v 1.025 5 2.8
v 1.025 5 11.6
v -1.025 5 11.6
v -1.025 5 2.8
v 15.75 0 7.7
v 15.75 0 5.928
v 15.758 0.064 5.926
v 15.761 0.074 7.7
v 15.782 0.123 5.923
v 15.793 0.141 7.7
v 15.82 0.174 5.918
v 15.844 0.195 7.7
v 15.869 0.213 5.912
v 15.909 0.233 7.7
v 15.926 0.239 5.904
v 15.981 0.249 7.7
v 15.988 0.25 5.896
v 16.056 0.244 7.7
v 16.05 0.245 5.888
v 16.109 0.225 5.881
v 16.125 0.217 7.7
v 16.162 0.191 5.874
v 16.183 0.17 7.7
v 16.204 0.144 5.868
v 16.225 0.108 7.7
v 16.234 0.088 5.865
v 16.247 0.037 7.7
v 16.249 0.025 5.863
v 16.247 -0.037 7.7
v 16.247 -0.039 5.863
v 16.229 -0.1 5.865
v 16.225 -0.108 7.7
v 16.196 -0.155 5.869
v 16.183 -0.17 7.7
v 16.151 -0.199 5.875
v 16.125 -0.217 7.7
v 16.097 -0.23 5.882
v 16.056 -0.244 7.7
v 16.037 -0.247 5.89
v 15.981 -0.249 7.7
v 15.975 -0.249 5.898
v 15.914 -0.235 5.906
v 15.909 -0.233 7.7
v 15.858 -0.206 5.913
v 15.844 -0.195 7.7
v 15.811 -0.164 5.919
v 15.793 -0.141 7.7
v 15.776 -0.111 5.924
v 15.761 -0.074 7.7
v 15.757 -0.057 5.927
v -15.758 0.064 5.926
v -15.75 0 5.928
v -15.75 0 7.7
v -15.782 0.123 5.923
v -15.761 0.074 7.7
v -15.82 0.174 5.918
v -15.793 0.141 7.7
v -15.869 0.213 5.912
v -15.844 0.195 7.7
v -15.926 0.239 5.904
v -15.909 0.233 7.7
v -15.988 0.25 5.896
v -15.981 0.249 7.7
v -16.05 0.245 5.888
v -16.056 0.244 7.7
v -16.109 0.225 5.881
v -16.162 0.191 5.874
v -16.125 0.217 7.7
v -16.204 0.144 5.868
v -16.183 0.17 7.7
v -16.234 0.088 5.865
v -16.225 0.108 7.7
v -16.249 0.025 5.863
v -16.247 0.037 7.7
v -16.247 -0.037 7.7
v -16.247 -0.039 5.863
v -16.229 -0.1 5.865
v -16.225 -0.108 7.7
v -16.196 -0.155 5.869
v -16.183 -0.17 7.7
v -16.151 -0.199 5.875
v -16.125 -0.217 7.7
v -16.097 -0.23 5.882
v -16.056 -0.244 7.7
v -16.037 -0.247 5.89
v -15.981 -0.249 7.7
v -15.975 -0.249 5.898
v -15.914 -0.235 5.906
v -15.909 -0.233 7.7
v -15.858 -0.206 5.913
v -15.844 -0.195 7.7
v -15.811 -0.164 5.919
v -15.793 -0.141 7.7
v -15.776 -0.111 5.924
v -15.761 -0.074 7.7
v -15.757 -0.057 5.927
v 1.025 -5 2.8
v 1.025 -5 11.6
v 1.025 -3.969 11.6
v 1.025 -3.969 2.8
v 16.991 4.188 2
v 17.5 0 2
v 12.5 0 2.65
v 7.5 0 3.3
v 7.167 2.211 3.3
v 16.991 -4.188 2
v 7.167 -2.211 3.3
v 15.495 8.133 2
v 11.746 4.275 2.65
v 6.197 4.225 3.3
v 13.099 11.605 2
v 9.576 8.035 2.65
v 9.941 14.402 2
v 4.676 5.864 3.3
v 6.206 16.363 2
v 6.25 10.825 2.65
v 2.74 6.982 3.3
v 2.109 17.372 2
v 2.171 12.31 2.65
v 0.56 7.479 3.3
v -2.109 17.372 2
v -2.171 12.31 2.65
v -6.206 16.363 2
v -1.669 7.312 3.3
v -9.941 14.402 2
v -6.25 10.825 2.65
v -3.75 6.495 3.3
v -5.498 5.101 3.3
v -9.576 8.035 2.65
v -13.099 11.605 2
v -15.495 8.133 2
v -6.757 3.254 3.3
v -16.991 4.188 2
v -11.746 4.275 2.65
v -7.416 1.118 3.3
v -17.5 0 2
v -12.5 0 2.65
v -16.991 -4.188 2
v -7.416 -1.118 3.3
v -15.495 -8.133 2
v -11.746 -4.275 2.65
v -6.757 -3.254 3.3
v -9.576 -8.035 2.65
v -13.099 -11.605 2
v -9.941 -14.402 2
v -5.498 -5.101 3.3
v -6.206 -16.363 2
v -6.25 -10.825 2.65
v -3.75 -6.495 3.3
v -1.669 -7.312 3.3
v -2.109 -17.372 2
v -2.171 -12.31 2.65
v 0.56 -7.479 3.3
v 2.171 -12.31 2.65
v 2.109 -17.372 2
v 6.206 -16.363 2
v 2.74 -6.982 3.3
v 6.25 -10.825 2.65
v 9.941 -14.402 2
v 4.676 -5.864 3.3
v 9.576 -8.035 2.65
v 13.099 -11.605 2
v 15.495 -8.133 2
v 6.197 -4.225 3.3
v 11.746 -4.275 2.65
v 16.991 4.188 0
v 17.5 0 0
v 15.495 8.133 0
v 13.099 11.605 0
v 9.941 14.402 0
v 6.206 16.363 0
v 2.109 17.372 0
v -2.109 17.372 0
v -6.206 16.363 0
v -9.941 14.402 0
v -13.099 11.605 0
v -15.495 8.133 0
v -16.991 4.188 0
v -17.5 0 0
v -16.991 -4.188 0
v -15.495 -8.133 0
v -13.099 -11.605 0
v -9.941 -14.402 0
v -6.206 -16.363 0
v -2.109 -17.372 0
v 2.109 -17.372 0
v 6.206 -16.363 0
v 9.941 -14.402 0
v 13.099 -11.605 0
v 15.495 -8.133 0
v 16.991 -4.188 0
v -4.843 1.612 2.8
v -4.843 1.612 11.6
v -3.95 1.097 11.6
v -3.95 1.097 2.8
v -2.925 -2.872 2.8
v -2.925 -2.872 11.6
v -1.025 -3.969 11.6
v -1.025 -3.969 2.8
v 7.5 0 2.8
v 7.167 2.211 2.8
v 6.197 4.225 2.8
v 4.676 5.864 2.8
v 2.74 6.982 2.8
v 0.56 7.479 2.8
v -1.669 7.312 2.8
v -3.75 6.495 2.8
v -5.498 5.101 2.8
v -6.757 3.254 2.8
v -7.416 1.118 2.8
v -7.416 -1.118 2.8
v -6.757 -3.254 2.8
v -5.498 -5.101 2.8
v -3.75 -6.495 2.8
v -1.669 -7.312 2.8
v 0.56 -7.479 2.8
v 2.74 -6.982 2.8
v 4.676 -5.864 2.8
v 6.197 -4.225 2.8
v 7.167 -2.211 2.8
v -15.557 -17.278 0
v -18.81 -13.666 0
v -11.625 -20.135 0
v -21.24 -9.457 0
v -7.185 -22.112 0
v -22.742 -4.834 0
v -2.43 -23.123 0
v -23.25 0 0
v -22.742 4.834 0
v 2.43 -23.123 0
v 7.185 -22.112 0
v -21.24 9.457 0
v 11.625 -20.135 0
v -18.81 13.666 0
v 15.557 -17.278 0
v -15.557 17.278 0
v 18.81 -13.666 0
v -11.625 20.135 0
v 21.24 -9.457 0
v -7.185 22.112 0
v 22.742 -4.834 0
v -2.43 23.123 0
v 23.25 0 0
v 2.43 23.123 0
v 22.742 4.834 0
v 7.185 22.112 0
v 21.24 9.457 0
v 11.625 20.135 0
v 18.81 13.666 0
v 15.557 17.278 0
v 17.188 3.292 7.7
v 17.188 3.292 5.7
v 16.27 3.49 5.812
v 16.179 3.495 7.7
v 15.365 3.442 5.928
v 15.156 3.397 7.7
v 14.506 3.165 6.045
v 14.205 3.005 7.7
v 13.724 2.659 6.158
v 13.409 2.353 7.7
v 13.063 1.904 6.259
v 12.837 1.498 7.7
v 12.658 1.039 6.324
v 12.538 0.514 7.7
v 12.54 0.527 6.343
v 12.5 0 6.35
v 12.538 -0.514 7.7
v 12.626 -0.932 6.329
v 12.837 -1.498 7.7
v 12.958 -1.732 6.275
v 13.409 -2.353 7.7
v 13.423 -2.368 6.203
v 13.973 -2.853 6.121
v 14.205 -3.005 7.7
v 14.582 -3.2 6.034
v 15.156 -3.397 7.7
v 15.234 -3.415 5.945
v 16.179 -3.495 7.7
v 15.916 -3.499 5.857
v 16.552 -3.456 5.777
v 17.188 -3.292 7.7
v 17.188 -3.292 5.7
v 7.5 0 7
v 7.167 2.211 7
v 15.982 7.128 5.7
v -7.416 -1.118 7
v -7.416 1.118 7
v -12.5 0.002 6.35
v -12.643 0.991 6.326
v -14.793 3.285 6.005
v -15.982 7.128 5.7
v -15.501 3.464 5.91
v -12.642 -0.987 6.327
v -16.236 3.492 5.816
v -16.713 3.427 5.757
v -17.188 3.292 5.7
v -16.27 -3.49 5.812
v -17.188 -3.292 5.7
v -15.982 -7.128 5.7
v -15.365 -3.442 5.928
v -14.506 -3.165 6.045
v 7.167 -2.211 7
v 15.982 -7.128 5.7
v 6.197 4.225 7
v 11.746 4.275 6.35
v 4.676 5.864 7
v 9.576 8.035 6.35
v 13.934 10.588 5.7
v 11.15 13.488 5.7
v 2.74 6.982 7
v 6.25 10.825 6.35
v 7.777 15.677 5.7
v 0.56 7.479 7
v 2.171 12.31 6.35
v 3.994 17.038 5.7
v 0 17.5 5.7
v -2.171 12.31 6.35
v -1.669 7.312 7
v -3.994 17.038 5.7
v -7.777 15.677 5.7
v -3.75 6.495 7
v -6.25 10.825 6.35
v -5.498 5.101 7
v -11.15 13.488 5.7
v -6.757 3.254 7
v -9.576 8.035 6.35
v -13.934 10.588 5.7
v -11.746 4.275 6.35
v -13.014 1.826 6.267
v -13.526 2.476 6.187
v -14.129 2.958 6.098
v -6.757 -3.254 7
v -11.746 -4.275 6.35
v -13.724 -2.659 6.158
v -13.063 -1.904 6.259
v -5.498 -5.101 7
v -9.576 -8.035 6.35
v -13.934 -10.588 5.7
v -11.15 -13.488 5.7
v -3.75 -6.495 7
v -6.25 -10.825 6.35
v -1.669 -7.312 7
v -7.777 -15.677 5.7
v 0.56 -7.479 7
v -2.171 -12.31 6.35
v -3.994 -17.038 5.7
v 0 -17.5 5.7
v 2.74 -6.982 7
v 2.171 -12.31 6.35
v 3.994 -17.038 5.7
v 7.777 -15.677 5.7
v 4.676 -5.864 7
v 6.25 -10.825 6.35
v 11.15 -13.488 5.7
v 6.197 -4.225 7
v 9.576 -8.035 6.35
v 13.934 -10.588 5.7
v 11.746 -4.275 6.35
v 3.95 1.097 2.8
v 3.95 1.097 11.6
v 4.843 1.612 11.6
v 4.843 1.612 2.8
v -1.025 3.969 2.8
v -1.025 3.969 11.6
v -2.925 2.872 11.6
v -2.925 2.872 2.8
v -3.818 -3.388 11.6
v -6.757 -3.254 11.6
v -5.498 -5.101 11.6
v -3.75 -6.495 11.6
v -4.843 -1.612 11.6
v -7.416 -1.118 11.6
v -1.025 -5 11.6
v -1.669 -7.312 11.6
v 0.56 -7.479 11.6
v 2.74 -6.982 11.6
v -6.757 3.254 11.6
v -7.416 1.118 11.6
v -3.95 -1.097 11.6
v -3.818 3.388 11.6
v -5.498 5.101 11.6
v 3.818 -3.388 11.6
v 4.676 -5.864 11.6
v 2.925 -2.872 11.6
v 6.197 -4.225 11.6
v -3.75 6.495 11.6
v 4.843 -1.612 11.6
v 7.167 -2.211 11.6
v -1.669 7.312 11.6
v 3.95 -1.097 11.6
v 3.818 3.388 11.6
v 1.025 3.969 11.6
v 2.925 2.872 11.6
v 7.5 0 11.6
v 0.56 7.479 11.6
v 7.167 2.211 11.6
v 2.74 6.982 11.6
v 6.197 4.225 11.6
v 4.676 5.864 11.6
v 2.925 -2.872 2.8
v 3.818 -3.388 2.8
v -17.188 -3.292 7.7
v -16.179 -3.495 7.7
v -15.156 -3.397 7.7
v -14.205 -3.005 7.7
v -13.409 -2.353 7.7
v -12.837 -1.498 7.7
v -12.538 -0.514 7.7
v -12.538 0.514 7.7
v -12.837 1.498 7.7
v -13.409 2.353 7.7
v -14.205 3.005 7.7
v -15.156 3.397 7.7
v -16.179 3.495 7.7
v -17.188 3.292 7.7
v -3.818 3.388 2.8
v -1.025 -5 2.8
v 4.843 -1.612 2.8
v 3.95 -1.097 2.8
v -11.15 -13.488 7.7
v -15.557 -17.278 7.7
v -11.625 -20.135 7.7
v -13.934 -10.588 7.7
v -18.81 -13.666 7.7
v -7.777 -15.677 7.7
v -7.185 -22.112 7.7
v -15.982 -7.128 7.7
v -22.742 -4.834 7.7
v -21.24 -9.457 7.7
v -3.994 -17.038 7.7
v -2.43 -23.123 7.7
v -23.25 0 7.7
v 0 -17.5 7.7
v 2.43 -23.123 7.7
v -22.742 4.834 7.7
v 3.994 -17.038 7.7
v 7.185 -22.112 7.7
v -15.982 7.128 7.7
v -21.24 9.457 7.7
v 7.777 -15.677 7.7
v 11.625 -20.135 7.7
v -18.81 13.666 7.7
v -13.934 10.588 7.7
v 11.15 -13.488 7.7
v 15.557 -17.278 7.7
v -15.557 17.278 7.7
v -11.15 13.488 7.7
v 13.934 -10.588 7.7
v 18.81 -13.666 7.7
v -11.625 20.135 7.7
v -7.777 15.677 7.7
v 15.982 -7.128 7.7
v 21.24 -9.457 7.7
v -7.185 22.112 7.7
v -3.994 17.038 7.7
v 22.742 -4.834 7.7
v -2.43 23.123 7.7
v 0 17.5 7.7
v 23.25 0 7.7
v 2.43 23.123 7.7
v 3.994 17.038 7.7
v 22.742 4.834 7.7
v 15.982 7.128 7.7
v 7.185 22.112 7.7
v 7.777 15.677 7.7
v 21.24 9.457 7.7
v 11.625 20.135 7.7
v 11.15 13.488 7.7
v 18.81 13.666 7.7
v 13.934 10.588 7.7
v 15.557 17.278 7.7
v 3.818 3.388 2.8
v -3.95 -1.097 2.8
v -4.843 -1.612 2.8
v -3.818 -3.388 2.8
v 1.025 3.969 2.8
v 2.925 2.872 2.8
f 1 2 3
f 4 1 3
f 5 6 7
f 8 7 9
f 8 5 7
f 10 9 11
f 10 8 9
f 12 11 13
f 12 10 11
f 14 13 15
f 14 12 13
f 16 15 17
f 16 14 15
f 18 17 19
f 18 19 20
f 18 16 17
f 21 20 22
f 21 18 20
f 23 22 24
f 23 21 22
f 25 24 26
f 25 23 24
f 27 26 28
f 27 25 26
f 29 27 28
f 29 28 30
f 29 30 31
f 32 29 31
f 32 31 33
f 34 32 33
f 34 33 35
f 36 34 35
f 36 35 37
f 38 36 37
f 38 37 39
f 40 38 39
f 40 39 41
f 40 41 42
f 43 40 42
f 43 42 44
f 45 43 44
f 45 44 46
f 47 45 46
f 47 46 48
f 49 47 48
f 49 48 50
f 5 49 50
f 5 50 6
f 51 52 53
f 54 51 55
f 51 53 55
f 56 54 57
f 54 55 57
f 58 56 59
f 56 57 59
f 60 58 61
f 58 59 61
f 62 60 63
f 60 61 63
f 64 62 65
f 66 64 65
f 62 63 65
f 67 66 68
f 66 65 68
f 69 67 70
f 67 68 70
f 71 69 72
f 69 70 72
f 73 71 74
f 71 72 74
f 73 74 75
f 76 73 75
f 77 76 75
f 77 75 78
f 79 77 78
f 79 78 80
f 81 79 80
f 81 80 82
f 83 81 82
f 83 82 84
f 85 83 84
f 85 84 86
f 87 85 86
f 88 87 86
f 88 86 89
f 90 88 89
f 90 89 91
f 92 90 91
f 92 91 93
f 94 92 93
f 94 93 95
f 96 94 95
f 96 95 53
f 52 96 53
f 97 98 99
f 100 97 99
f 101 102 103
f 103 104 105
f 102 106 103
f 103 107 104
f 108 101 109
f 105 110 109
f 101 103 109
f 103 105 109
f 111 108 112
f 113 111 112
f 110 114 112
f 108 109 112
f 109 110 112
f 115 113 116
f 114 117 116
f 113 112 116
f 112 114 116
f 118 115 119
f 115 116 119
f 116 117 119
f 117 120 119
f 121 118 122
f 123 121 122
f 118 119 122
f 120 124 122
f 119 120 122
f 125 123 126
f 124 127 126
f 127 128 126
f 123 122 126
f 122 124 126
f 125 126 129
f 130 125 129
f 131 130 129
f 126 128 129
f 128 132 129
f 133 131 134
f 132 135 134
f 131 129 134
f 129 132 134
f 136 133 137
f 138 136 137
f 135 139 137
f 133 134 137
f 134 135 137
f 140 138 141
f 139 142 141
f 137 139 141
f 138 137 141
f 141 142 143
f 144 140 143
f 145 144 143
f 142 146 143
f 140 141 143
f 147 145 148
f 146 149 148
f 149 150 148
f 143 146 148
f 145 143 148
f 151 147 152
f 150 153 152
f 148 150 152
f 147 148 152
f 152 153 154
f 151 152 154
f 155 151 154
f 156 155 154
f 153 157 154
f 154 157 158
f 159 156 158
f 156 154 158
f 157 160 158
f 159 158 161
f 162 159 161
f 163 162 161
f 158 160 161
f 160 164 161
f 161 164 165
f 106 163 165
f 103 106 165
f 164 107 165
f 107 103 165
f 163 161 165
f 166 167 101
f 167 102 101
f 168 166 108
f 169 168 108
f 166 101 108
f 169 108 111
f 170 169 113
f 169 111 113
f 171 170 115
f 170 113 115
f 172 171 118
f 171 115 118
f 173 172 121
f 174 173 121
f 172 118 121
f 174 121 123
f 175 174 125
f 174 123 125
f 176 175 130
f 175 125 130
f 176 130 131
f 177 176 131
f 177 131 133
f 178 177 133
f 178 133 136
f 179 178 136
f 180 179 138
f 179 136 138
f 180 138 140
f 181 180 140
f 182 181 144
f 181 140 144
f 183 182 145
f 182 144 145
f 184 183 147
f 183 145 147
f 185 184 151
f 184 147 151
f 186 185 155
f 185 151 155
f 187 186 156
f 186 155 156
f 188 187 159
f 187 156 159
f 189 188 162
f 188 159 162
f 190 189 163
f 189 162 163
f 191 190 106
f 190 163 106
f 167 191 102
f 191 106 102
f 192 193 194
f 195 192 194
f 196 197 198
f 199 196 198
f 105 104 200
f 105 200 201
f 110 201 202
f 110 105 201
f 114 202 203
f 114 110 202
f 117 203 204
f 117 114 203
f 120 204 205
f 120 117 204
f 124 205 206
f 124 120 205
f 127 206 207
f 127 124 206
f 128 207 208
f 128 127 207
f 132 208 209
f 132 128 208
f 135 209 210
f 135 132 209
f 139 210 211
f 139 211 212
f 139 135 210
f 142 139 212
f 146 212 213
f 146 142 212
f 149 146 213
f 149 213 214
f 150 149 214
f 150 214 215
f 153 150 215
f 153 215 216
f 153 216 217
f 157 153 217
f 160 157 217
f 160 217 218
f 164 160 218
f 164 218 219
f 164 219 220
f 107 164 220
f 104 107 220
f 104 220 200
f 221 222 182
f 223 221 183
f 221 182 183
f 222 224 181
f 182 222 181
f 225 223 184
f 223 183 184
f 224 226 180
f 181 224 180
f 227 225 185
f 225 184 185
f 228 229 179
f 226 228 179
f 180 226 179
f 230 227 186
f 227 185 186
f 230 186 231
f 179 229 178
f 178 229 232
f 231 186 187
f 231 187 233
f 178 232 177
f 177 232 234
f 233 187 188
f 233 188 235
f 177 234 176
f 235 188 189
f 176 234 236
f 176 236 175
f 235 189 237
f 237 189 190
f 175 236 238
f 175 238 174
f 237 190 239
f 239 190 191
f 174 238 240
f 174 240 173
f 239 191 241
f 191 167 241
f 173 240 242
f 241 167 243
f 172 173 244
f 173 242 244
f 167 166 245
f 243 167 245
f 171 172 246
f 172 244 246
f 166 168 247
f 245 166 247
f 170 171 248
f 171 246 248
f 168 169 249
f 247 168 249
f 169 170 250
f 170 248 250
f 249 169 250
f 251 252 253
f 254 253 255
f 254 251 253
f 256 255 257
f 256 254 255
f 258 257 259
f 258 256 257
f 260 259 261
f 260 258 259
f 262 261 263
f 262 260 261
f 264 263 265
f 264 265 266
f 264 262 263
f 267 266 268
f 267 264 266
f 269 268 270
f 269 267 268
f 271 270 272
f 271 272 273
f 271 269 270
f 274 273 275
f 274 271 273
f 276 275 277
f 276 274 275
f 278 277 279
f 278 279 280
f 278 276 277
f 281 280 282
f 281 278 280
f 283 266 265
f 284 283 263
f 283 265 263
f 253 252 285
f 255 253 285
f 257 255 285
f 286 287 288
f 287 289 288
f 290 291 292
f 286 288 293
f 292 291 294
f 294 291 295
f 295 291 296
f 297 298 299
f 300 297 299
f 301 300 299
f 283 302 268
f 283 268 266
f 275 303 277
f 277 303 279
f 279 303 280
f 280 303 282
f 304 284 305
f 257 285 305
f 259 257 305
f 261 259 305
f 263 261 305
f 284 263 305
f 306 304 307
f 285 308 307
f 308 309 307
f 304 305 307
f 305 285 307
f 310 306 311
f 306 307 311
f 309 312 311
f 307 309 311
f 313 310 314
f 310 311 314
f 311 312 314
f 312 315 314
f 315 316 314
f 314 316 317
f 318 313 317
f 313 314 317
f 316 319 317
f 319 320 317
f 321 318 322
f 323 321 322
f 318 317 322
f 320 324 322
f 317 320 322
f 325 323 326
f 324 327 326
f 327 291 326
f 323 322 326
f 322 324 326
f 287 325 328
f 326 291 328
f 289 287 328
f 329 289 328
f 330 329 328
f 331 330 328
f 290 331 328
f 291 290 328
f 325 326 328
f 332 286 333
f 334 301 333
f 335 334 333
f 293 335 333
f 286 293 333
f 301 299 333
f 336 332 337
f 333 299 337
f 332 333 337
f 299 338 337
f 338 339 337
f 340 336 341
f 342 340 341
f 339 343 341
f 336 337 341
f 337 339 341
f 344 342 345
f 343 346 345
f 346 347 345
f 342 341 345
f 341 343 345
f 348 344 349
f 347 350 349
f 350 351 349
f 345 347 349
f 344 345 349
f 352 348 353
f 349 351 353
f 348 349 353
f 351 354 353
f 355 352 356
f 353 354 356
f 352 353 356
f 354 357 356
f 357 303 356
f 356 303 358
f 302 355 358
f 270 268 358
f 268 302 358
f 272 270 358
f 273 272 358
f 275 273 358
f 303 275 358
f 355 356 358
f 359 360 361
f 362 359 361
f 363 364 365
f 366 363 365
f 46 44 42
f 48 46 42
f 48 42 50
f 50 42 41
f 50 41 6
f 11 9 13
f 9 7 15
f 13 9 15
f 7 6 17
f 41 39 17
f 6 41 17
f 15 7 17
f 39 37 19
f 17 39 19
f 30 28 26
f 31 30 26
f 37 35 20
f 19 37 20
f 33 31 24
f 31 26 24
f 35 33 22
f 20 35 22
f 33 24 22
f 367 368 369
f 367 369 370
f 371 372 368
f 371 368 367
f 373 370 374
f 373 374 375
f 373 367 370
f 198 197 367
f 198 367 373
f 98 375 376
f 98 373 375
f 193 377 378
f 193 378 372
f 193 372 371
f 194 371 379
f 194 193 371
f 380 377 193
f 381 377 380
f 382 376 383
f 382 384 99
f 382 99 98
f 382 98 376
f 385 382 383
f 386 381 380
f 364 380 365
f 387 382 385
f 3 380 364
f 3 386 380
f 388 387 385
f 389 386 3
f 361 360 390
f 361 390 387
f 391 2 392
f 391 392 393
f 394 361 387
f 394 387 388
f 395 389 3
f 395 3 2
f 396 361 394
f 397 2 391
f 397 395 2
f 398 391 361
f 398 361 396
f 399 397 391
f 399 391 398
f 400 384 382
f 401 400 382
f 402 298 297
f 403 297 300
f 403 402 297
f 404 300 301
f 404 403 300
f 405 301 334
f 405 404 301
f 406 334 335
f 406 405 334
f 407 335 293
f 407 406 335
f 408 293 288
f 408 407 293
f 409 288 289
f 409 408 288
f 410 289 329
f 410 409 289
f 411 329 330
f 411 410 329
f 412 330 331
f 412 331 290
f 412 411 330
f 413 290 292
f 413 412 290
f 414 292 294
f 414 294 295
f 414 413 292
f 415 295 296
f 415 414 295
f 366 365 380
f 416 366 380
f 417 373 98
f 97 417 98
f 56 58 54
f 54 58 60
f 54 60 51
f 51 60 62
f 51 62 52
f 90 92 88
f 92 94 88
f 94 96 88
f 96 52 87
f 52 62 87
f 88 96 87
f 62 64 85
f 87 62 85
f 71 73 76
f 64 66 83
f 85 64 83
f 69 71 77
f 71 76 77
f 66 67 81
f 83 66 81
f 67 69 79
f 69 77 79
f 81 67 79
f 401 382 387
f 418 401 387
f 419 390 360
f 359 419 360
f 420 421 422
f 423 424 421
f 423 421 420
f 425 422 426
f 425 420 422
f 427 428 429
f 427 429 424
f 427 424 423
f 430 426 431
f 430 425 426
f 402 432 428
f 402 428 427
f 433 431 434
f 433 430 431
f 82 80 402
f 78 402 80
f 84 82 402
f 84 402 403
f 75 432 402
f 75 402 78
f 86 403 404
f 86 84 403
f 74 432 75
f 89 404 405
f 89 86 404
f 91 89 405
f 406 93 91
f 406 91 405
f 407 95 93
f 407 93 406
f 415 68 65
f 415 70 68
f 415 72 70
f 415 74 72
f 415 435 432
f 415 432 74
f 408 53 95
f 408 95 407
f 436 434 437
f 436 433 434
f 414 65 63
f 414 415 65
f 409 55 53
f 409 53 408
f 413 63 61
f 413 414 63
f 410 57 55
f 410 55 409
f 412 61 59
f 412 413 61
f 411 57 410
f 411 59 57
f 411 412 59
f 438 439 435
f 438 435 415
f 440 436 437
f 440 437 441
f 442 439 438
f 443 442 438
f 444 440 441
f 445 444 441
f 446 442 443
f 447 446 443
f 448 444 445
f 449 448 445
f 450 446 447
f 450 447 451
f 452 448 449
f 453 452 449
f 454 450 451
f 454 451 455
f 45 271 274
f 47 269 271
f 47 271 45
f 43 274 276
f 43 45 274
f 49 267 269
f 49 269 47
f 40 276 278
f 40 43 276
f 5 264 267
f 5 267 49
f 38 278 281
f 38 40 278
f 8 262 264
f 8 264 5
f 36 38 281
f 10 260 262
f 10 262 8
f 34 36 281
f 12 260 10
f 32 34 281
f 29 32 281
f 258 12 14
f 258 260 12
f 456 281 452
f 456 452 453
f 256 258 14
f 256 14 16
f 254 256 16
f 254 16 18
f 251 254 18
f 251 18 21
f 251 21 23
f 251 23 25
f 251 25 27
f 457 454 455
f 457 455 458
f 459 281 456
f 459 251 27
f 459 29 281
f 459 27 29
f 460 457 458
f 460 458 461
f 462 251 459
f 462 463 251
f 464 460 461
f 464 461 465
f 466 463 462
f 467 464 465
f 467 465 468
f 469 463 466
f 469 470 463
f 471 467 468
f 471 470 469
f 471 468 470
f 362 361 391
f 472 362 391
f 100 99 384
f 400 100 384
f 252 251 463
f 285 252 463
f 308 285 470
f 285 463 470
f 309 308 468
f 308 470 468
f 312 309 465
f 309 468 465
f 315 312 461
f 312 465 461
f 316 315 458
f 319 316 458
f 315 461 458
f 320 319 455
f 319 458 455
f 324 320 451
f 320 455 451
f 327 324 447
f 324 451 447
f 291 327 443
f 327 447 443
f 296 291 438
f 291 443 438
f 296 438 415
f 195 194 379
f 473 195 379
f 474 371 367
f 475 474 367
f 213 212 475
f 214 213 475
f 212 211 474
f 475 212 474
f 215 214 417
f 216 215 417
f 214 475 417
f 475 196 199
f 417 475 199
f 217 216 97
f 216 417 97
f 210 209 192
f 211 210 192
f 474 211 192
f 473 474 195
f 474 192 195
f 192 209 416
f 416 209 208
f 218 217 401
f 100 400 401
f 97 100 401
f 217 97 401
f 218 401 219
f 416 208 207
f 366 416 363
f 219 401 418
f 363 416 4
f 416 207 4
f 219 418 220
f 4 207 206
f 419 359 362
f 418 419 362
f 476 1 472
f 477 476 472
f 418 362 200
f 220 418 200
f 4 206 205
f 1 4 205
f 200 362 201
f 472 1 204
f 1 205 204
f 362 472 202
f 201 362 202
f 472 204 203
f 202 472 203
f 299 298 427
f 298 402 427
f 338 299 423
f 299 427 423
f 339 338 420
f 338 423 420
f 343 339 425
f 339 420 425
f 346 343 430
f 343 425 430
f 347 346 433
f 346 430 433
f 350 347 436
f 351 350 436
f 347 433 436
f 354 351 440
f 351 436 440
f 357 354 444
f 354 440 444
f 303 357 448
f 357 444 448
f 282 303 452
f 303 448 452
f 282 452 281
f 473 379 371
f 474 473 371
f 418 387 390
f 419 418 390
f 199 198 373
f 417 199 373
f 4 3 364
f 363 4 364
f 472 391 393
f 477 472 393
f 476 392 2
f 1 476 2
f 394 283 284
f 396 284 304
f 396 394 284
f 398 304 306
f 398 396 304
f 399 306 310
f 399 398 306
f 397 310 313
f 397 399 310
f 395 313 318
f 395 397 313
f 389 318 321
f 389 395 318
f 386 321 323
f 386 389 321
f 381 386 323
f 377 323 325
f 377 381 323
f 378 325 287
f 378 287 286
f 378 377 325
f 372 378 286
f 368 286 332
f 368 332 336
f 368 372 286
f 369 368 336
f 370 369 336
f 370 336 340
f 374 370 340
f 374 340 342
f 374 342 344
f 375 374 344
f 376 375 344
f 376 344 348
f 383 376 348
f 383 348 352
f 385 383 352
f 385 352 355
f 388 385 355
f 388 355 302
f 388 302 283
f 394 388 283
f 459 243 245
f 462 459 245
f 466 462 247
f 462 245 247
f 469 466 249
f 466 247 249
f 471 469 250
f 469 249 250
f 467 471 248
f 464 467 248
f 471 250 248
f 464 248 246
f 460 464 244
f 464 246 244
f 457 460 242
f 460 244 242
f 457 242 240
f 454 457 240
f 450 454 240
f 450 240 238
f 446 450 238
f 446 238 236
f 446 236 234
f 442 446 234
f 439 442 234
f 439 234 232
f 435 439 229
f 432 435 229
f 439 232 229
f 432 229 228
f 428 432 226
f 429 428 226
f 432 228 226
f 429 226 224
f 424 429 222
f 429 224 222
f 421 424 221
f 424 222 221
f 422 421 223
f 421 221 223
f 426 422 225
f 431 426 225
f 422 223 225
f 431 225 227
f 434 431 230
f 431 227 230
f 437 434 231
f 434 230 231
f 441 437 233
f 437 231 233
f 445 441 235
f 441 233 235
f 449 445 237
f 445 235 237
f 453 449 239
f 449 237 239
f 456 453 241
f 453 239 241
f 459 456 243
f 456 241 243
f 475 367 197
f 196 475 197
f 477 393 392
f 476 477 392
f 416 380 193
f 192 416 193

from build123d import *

# Parameters (mm, degrees)
F0_R     = 23.25
F1_DEPTH = 7.7
F5_R     = 7.5
F6_DEPTH = 8.8
F8_DEPTH = 11.601
F9_R     = 3.5
F9_R_2   = 0.25


with BuildPart() as f1:
    # F0 (on Top) → F1 (new body)
    with BuildSketch(Plane.XY):
        Circle(F0_R)
    extrude(amount=F1_DEPTH)

    # F2 (on Front) → F3 (revolve, cut)
    with BuildSketch(Plane.XZ):
        Polygon((17.5, 5.7), (17.5, 11.6), (7.5, 11.6), (0, 11.6), (0, 7.975), align=None)
        Polygon((17.5, 2), (0, 4.275), (0, 0), (0, -2.8375450056), (17.5, -2.8375450056), align=None)
    revolve(axis=Axis((0, 0, 5.8), (0, 0, 1)), mode=Mode.SUBTRACT)

    # F5 (on offset) → F6 (join)
    with BuildSketch(Plane.XY.offset(11.6)):
        Circle(F5_R)
    extrude(amount=-F6_DEPTH)

    # F7 (on offset) → F8 (cut, through all)
    with BuildSketch(Plane.XY.offset(11.6)):
        Polygon((1.025, 3.9692831007), (0, 4.5610671266), (-1.025, 3.9692831007), (-2.925, 2.8723175892), (-3.95, 2.2805335633), (-3.95, 1.0969655115), (-3.95, -1.0969655115), (-3.95, -2.2805335633), (-2.925, -2.8723175892), (-1.025, -3.9692831007), (0, -4.5610671266), (1.025, -3.9692831007), (2.925, -2.8723175892), (3.95, -2.2805335633), (3.95, -1.0969655115), (3.95, 1.0969655115), (3.95, 2.2805335633), (2.925, 2.8723175892), align=None)
        Polygon((-1.025, 3.9692831007), (0, 4.5610671266), (1.025, 3.9692831007), (1.025, 5), (-1.025, 5), align=None)
        Polygon((3.8176270189, 3.3876760389), (2.925, 2.8723175892), (3.95, 2.2805335633), (3.95, 1.0969655115), (4.8426270189, 1.6123239611), align=None)
        Polygon((4.8426270189, -1.6123239611), (3.95, -1.0969655115), (3.95, -2.2805335633), (2.925, -2.8723175892), (3.8176270189, -3.3876760389), align=None)
        Polygon((1.025, -5), (1.025, -3.9692831007), (0, -4.5610671266), (-1.025, -3.9692831007), (-1.025, -5), align=None)
        Polygon((-3.95, -2.2805335633), (-3.95, -1.0969655115), (-4.8426270189, -1.6123239611), (-3.8176270189, -3.3876760389), (-2.925, -2.8723175892), align=None)
        Polygon((-3.95, 2.2805335633), (-2.925, 2.8723175892), (-3.8176270189, 3.3876760389), (-4.8426270189, 1.6123239611), (-3.95, 1.0969655115), align=None)
    extrude(amount=-F8_DEPTH, mode=Mode.SUBTRACT)

    # F9 (on face) → F10 (join, up to the next surface of F1)
    with BuildSketch(Plane.XY.offset(7.7)):
        with Locations((-16, 0)):
            Circle(F9_R)
        with Locations((-16, 0)):
            Circle(F9_R_2, mode=Mode.SUBTRACT)
        with BuildLine():
            ThreePointArc((19.5, 0), (16, 3.5), (12.5, 0))
            ThreePointArc((12.5, 0), (16, -3.5), (19.5, 0))
        make_face()
        with BuildLine():
            ThreePointArc((16.25, 0), (16, -0.25), (15.75, 0))
            ThreePointArc((15.75, 0), (16, 0.25), (16.25, 0))
        make_face(mode=Mode.SUBTRACT)
    extrude(until=Until.NEXT, dir=(0, 0, -1))


solid = f1.part
